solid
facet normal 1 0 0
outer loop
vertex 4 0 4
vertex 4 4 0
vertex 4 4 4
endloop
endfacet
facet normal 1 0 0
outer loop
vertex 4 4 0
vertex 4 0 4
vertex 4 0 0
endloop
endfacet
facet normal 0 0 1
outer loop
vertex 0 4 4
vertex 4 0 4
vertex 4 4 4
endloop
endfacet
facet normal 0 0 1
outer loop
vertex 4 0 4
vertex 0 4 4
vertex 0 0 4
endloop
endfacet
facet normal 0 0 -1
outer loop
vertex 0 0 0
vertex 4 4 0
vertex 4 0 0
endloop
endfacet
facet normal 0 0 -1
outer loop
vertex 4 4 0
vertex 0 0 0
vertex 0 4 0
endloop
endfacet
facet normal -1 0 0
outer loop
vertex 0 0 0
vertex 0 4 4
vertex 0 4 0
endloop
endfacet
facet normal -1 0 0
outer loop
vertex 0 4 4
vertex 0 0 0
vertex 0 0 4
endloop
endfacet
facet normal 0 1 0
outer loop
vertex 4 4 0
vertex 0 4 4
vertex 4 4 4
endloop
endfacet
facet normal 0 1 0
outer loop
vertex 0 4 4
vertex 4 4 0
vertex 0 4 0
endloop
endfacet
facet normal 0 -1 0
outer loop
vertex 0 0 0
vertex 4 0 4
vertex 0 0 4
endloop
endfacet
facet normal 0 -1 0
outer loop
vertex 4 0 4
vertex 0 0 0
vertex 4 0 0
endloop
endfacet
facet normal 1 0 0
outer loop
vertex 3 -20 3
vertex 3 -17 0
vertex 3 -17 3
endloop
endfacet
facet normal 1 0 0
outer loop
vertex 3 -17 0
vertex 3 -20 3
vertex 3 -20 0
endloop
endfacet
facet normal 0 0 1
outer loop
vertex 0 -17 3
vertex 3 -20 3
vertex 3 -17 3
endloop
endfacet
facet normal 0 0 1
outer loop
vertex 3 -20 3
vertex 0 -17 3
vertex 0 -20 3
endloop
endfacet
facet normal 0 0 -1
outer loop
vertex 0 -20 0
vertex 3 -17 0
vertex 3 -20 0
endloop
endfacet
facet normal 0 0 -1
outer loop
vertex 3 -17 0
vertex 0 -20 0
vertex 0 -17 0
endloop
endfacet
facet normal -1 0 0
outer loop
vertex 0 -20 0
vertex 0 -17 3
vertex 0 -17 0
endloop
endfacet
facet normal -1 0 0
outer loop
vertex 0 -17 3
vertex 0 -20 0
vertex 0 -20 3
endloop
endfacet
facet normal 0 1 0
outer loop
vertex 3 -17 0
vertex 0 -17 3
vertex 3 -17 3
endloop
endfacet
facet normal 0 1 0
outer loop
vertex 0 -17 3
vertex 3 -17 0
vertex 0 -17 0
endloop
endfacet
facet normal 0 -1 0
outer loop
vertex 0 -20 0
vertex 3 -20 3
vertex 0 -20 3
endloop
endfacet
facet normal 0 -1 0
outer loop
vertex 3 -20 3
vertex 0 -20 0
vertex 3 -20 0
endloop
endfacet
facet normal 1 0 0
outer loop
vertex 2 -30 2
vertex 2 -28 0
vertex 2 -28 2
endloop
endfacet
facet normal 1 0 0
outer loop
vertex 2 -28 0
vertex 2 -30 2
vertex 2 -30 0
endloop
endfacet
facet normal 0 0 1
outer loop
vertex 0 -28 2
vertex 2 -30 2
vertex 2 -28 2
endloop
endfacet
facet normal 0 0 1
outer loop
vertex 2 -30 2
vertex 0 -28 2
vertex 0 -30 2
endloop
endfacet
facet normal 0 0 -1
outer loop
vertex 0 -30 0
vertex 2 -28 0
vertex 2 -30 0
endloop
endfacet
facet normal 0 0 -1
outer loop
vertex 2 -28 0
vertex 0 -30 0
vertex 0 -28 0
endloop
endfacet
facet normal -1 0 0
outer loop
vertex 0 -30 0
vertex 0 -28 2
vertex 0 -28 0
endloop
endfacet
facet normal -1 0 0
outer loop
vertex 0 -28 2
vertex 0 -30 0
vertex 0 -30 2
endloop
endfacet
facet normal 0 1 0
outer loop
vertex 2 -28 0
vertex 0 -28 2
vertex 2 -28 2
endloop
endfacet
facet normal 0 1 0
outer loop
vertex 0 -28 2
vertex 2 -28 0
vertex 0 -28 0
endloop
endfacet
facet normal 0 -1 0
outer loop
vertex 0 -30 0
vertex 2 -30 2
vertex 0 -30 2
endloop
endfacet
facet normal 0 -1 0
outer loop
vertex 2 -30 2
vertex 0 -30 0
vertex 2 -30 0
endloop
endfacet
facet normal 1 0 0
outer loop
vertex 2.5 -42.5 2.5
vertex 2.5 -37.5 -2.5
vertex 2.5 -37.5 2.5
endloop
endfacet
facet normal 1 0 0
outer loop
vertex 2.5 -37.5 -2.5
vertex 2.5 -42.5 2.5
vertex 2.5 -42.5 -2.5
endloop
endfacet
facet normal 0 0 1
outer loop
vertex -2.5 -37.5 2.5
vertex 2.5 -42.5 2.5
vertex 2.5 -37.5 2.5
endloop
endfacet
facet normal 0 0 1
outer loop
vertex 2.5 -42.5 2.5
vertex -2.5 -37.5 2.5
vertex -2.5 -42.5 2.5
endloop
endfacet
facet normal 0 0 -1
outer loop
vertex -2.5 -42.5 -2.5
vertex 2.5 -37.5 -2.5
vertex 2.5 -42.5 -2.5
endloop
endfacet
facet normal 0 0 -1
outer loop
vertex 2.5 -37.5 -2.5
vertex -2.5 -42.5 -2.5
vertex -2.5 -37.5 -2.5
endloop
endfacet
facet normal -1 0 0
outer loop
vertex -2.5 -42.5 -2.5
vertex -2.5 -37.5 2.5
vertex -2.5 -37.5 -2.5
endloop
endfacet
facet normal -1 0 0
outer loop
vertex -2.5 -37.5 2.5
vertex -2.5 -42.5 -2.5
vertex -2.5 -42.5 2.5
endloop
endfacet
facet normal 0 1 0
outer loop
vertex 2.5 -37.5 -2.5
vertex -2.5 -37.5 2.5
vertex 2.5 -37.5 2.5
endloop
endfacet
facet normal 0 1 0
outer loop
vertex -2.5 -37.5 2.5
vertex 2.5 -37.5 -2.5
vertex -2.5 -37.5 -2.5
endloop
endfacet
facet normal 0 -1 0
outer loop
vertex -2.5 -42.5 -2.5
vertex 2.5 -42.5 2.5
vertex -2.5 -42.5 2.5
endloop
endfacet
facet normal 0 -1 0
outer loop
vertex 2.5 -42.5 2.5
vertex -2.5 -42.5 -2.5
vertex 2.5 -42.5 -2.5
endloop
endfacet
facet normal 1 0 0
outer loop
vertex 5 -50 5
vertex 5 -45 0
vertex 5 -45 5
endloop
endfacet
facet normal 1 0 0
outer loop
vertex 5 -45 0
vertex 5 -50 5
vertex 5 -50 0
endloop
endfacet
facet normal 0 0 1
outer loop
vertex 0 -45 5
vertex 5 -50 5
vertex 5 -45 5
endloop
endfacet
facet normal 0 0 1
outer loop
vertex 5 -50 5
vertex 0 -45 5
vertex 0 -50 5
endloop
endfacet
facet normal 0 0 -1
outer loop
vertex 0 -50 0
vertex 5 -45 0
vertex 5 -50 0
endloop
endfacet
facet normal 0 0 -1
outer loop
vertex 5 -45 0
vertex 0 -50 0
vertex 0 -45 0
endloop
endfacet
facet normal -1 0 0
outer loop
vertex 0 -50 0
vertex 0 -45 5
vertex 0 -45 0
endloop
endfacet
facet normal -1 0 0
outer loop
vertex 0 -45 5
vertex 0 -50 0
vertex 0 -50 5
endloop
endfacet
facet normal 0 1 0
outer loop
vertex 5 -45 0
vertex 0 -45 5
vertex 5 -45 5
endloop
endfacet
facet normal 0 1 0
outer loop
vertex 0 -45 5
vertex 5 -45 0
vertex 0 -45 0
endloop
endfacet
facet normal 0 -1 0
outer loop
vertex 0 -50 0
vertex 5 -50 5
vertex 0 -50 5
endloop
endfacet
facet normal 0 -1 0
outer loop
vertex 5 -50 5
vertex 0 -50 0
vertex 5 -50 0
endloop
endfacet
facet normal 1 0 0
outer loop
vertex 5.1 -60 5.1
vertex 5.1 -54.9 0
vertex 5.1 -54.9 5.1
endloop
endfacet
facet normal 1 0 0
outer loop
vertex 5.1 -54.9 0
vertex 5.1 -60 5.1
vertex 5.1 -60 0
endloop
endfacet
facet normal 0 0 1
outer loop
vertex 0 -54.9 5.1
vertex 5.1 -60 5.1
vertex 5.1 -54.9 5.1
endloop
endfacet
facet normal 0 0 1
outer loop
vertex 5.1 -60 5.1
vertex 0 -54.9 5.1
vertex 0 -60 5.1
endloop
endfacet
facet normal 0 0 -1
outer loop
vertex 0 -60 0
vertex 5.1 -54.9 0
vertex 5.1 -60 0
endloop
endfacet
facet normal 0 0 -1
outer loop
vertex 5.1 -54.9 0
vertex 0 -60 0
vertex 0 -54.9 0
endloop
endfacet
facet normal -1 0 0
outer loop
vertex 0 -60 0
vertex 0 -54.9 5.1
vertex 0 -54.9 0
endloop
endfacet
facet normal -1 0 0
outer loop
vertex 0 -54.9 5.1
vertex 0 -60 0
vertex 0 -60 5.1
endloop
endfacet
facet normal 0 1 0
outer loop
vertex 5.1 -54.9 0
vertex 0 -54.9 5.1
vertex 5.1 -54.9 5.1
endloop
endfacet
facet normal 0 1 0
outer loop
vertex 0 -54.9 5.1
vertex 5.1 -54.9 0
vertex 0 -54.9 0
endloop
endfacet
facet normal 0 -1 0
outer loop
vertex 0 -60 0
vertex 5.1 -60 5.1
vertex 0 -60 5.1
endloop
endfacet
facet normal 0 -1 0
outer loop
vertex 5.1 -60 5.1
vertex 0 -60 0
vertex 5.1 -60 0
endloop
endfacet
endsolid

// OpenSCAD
// Generated by SolidPython 1.0.5 on 2021-06-01 16:28:58

1_angle = 0; // [0: 90]
1_offset = 2; // [0: 2: 10]
1_sideLength = 1; // [1: 1: 10]
a_numbers_dropdown = 4; // [2, 4, 12, 14]
b_strings_dropdown = "foo"; // [foo, bar, baz]
c_slider = 3; // [1: 10]
d_step_slider = 2; // [0: 5: 100]
e_checkbox = true;
f_spinbox = 5;
g_float_spinbox = 5.1;
h_textbox = "hello";


union() {
	rotate(a = [0, 0, 1_angle]) {
		translate(v = [1_offset, 1_offset, 0]) {
			cylinder(h = (1_sideLength * 3), r1 = (1_sideLength * 2), r2 = 1_sideLength);
		}
	}
	union() {
		translate(v = [0, 0, 0]) {
			cube(size = a_numbers_dropdown);
		}
		translate(v = [0, -10, 0]) {
			text(text = b_strings_dropdown);
		}
		translate(v = [0, -20, 0]) {
			cube(size = c_slider);
		}
		translate(v = [0, -30, 0]) {
			cube(size = d_step_slider);
		}
		translate(v = [0, -40, 0]) {
			cube(center = e_checkbox, size = 5);
		}
		translate(v = [0, -50, 0]) {
			cube(size = f_spinbox);
		}
		translate(v = [0, -60, 0]) {
			cube(size = g_float_spinbox);
		}
		translate(v = [0, -70, 0]) {
			text(text = h_textbox);
		}
	}
}
/***********************************************
*********      SolidPython code:      **********
************************************************
 
#! /usr/bin/env python3
import sys
from pathlib import Path

from solid import (cylinder, rotate, translate, scad_render_to_file, union, cube, text)
from solid.customizer import (CustomizerCheckbox, CustomizerDropdownString, CustomizerSlider,
    CustomizerDropdownNumber, CustomizerSpinbox, CustomizerTextbox)
SEGMENTS = 48

def ported_scad_example():
    elts = []

    # // combo box for number
    # SCAD: a_numbers_dropdown = 4; // [2, 4, 12, 14]
    a_numbers_dropdown = CustomizerDropdownNumber('a_numbers_dropdown', 4, [2, 4, 12, 14])
    elts.append (cube(a_numbers_dropdown))

    # // combo box for string
    # SCAD: b_strings_dropdown = "foo"; // [foo, bar, baz]    
    b_strings_dropdown = CustomizerDropdownString('b_strings_dropdown', 'foo', ['foo', 'bar', 'baz']  )
    elts.append( text(b_strings_dropdown))

    # // labeled combo box for string
    # Strings = "M"; // []

    # // slider widget for number
    # SCAD: slider =34; // [10:100]
    c_slider = CustomizerSlider('c_slider', 3, 1, 10)
    elts.append( cube(c_slider))

    # //step slider for number
    # SCAD: stepSlider=2; //[0:5:100]
    d_step_slider = CustomizerSlider('d_step_slider', 2, 0, 100, 5)
    elts.append( cube(d_step_slider))

    # Checkbox
    # SCAD: e_checkbox = true;
    e_checkbox = CustomizerCheckbox('e_checkbox', True)
    elts.append( cube(size=5, center=e_checkbox))

    # Spinbox with step size 1
    # SCAD: f_spinbox = 5;
    f_spinbox = CustomizerSpinbox('f_spinbox', 5)
    elts.append( cube(f_spinbox))

    # // spinbox with step size 0.01
    # SCAD: g_float_spinbox = 5.1;
    g_float_spinbox = CustomizerSpinbox('g_float_spinbox', 5.1)
    elts.append( cube(g_float_spinbox))

    # Textbox:
    # // Text box for string
    # SCAD: h_textbox = "hello";    
    h_textbox = CustomizerTextbox('h_textbox', 'hello')
    elts.append( text(h_textbox))

    # TODO: compound Spinboxes for 1-4 numbers, & textbox for 5+ numbers

    # Move everything down in a line from y=0 so we can see the different objects
    elts = [translate([0,-10*i,0])(e) for i,e in enumerate(elts)]

    # And return everything; Customizer instances that aren't used in OpenSCAD
    # objects and rendered won't appear in the final SCAD file
    a = union()( elts )
    return a

def custom_cube():
    side_length = CustomizerSlider('1_sideLength', 1, min_val=1, max_val=10, step=1)
    offset= CustomizerSlider('1_offset', 2, min_val=0, max_val=10, step=2)
    angle = CustomizerSlider('1_angle', 0, min_val=0, max_val=90) # Note no step value; OpenSCAD supplies

    # Once you've defined your Customizer objects, use them naturally like you 
    # would Python variables. SolidPython will put the correct OpenSCAD code at 
    # the beginning of the file so that the GUI is defined.
    a = rotate([0, 0, angle])(
        translate([offset, offset, 0])(
            cylinder(r1=2*side_length, r2=side_length, h=3*side_length)
        )
    )

    return a

# FIXME: include examples of ways we *can't* use Customizer objects just like 
# Python variables. Basically, you can use a Customizer as an argument to an OpenSCAD
# function, but if you're doing pure Python things, OpenSCAD won't pick up on the
# use of a Customizer variable. 
# E.g. ```
# slider_val = CustomizedSlider('slider_val', val=4, min_val=2, max_val=10)
# objs = [some_obj(i) for i in range(slider_val)]
# ```
# This will always return 4 objects, since the list comprehension is pure Python
# and won't be passed on to OpenSCAD.
if __name__ == '__main__':
    out_dir = Path(sys.argv[1]) if len(sys.argv) > 1 else None
    a = custom_cube()
    a += ported_scad_example()
    file_out = scad_render_to_file(a, out_dir=out_dir)
    print(f"{__file__}: SCAD file written to: \n{file_out}")
 
 
************************************************/
